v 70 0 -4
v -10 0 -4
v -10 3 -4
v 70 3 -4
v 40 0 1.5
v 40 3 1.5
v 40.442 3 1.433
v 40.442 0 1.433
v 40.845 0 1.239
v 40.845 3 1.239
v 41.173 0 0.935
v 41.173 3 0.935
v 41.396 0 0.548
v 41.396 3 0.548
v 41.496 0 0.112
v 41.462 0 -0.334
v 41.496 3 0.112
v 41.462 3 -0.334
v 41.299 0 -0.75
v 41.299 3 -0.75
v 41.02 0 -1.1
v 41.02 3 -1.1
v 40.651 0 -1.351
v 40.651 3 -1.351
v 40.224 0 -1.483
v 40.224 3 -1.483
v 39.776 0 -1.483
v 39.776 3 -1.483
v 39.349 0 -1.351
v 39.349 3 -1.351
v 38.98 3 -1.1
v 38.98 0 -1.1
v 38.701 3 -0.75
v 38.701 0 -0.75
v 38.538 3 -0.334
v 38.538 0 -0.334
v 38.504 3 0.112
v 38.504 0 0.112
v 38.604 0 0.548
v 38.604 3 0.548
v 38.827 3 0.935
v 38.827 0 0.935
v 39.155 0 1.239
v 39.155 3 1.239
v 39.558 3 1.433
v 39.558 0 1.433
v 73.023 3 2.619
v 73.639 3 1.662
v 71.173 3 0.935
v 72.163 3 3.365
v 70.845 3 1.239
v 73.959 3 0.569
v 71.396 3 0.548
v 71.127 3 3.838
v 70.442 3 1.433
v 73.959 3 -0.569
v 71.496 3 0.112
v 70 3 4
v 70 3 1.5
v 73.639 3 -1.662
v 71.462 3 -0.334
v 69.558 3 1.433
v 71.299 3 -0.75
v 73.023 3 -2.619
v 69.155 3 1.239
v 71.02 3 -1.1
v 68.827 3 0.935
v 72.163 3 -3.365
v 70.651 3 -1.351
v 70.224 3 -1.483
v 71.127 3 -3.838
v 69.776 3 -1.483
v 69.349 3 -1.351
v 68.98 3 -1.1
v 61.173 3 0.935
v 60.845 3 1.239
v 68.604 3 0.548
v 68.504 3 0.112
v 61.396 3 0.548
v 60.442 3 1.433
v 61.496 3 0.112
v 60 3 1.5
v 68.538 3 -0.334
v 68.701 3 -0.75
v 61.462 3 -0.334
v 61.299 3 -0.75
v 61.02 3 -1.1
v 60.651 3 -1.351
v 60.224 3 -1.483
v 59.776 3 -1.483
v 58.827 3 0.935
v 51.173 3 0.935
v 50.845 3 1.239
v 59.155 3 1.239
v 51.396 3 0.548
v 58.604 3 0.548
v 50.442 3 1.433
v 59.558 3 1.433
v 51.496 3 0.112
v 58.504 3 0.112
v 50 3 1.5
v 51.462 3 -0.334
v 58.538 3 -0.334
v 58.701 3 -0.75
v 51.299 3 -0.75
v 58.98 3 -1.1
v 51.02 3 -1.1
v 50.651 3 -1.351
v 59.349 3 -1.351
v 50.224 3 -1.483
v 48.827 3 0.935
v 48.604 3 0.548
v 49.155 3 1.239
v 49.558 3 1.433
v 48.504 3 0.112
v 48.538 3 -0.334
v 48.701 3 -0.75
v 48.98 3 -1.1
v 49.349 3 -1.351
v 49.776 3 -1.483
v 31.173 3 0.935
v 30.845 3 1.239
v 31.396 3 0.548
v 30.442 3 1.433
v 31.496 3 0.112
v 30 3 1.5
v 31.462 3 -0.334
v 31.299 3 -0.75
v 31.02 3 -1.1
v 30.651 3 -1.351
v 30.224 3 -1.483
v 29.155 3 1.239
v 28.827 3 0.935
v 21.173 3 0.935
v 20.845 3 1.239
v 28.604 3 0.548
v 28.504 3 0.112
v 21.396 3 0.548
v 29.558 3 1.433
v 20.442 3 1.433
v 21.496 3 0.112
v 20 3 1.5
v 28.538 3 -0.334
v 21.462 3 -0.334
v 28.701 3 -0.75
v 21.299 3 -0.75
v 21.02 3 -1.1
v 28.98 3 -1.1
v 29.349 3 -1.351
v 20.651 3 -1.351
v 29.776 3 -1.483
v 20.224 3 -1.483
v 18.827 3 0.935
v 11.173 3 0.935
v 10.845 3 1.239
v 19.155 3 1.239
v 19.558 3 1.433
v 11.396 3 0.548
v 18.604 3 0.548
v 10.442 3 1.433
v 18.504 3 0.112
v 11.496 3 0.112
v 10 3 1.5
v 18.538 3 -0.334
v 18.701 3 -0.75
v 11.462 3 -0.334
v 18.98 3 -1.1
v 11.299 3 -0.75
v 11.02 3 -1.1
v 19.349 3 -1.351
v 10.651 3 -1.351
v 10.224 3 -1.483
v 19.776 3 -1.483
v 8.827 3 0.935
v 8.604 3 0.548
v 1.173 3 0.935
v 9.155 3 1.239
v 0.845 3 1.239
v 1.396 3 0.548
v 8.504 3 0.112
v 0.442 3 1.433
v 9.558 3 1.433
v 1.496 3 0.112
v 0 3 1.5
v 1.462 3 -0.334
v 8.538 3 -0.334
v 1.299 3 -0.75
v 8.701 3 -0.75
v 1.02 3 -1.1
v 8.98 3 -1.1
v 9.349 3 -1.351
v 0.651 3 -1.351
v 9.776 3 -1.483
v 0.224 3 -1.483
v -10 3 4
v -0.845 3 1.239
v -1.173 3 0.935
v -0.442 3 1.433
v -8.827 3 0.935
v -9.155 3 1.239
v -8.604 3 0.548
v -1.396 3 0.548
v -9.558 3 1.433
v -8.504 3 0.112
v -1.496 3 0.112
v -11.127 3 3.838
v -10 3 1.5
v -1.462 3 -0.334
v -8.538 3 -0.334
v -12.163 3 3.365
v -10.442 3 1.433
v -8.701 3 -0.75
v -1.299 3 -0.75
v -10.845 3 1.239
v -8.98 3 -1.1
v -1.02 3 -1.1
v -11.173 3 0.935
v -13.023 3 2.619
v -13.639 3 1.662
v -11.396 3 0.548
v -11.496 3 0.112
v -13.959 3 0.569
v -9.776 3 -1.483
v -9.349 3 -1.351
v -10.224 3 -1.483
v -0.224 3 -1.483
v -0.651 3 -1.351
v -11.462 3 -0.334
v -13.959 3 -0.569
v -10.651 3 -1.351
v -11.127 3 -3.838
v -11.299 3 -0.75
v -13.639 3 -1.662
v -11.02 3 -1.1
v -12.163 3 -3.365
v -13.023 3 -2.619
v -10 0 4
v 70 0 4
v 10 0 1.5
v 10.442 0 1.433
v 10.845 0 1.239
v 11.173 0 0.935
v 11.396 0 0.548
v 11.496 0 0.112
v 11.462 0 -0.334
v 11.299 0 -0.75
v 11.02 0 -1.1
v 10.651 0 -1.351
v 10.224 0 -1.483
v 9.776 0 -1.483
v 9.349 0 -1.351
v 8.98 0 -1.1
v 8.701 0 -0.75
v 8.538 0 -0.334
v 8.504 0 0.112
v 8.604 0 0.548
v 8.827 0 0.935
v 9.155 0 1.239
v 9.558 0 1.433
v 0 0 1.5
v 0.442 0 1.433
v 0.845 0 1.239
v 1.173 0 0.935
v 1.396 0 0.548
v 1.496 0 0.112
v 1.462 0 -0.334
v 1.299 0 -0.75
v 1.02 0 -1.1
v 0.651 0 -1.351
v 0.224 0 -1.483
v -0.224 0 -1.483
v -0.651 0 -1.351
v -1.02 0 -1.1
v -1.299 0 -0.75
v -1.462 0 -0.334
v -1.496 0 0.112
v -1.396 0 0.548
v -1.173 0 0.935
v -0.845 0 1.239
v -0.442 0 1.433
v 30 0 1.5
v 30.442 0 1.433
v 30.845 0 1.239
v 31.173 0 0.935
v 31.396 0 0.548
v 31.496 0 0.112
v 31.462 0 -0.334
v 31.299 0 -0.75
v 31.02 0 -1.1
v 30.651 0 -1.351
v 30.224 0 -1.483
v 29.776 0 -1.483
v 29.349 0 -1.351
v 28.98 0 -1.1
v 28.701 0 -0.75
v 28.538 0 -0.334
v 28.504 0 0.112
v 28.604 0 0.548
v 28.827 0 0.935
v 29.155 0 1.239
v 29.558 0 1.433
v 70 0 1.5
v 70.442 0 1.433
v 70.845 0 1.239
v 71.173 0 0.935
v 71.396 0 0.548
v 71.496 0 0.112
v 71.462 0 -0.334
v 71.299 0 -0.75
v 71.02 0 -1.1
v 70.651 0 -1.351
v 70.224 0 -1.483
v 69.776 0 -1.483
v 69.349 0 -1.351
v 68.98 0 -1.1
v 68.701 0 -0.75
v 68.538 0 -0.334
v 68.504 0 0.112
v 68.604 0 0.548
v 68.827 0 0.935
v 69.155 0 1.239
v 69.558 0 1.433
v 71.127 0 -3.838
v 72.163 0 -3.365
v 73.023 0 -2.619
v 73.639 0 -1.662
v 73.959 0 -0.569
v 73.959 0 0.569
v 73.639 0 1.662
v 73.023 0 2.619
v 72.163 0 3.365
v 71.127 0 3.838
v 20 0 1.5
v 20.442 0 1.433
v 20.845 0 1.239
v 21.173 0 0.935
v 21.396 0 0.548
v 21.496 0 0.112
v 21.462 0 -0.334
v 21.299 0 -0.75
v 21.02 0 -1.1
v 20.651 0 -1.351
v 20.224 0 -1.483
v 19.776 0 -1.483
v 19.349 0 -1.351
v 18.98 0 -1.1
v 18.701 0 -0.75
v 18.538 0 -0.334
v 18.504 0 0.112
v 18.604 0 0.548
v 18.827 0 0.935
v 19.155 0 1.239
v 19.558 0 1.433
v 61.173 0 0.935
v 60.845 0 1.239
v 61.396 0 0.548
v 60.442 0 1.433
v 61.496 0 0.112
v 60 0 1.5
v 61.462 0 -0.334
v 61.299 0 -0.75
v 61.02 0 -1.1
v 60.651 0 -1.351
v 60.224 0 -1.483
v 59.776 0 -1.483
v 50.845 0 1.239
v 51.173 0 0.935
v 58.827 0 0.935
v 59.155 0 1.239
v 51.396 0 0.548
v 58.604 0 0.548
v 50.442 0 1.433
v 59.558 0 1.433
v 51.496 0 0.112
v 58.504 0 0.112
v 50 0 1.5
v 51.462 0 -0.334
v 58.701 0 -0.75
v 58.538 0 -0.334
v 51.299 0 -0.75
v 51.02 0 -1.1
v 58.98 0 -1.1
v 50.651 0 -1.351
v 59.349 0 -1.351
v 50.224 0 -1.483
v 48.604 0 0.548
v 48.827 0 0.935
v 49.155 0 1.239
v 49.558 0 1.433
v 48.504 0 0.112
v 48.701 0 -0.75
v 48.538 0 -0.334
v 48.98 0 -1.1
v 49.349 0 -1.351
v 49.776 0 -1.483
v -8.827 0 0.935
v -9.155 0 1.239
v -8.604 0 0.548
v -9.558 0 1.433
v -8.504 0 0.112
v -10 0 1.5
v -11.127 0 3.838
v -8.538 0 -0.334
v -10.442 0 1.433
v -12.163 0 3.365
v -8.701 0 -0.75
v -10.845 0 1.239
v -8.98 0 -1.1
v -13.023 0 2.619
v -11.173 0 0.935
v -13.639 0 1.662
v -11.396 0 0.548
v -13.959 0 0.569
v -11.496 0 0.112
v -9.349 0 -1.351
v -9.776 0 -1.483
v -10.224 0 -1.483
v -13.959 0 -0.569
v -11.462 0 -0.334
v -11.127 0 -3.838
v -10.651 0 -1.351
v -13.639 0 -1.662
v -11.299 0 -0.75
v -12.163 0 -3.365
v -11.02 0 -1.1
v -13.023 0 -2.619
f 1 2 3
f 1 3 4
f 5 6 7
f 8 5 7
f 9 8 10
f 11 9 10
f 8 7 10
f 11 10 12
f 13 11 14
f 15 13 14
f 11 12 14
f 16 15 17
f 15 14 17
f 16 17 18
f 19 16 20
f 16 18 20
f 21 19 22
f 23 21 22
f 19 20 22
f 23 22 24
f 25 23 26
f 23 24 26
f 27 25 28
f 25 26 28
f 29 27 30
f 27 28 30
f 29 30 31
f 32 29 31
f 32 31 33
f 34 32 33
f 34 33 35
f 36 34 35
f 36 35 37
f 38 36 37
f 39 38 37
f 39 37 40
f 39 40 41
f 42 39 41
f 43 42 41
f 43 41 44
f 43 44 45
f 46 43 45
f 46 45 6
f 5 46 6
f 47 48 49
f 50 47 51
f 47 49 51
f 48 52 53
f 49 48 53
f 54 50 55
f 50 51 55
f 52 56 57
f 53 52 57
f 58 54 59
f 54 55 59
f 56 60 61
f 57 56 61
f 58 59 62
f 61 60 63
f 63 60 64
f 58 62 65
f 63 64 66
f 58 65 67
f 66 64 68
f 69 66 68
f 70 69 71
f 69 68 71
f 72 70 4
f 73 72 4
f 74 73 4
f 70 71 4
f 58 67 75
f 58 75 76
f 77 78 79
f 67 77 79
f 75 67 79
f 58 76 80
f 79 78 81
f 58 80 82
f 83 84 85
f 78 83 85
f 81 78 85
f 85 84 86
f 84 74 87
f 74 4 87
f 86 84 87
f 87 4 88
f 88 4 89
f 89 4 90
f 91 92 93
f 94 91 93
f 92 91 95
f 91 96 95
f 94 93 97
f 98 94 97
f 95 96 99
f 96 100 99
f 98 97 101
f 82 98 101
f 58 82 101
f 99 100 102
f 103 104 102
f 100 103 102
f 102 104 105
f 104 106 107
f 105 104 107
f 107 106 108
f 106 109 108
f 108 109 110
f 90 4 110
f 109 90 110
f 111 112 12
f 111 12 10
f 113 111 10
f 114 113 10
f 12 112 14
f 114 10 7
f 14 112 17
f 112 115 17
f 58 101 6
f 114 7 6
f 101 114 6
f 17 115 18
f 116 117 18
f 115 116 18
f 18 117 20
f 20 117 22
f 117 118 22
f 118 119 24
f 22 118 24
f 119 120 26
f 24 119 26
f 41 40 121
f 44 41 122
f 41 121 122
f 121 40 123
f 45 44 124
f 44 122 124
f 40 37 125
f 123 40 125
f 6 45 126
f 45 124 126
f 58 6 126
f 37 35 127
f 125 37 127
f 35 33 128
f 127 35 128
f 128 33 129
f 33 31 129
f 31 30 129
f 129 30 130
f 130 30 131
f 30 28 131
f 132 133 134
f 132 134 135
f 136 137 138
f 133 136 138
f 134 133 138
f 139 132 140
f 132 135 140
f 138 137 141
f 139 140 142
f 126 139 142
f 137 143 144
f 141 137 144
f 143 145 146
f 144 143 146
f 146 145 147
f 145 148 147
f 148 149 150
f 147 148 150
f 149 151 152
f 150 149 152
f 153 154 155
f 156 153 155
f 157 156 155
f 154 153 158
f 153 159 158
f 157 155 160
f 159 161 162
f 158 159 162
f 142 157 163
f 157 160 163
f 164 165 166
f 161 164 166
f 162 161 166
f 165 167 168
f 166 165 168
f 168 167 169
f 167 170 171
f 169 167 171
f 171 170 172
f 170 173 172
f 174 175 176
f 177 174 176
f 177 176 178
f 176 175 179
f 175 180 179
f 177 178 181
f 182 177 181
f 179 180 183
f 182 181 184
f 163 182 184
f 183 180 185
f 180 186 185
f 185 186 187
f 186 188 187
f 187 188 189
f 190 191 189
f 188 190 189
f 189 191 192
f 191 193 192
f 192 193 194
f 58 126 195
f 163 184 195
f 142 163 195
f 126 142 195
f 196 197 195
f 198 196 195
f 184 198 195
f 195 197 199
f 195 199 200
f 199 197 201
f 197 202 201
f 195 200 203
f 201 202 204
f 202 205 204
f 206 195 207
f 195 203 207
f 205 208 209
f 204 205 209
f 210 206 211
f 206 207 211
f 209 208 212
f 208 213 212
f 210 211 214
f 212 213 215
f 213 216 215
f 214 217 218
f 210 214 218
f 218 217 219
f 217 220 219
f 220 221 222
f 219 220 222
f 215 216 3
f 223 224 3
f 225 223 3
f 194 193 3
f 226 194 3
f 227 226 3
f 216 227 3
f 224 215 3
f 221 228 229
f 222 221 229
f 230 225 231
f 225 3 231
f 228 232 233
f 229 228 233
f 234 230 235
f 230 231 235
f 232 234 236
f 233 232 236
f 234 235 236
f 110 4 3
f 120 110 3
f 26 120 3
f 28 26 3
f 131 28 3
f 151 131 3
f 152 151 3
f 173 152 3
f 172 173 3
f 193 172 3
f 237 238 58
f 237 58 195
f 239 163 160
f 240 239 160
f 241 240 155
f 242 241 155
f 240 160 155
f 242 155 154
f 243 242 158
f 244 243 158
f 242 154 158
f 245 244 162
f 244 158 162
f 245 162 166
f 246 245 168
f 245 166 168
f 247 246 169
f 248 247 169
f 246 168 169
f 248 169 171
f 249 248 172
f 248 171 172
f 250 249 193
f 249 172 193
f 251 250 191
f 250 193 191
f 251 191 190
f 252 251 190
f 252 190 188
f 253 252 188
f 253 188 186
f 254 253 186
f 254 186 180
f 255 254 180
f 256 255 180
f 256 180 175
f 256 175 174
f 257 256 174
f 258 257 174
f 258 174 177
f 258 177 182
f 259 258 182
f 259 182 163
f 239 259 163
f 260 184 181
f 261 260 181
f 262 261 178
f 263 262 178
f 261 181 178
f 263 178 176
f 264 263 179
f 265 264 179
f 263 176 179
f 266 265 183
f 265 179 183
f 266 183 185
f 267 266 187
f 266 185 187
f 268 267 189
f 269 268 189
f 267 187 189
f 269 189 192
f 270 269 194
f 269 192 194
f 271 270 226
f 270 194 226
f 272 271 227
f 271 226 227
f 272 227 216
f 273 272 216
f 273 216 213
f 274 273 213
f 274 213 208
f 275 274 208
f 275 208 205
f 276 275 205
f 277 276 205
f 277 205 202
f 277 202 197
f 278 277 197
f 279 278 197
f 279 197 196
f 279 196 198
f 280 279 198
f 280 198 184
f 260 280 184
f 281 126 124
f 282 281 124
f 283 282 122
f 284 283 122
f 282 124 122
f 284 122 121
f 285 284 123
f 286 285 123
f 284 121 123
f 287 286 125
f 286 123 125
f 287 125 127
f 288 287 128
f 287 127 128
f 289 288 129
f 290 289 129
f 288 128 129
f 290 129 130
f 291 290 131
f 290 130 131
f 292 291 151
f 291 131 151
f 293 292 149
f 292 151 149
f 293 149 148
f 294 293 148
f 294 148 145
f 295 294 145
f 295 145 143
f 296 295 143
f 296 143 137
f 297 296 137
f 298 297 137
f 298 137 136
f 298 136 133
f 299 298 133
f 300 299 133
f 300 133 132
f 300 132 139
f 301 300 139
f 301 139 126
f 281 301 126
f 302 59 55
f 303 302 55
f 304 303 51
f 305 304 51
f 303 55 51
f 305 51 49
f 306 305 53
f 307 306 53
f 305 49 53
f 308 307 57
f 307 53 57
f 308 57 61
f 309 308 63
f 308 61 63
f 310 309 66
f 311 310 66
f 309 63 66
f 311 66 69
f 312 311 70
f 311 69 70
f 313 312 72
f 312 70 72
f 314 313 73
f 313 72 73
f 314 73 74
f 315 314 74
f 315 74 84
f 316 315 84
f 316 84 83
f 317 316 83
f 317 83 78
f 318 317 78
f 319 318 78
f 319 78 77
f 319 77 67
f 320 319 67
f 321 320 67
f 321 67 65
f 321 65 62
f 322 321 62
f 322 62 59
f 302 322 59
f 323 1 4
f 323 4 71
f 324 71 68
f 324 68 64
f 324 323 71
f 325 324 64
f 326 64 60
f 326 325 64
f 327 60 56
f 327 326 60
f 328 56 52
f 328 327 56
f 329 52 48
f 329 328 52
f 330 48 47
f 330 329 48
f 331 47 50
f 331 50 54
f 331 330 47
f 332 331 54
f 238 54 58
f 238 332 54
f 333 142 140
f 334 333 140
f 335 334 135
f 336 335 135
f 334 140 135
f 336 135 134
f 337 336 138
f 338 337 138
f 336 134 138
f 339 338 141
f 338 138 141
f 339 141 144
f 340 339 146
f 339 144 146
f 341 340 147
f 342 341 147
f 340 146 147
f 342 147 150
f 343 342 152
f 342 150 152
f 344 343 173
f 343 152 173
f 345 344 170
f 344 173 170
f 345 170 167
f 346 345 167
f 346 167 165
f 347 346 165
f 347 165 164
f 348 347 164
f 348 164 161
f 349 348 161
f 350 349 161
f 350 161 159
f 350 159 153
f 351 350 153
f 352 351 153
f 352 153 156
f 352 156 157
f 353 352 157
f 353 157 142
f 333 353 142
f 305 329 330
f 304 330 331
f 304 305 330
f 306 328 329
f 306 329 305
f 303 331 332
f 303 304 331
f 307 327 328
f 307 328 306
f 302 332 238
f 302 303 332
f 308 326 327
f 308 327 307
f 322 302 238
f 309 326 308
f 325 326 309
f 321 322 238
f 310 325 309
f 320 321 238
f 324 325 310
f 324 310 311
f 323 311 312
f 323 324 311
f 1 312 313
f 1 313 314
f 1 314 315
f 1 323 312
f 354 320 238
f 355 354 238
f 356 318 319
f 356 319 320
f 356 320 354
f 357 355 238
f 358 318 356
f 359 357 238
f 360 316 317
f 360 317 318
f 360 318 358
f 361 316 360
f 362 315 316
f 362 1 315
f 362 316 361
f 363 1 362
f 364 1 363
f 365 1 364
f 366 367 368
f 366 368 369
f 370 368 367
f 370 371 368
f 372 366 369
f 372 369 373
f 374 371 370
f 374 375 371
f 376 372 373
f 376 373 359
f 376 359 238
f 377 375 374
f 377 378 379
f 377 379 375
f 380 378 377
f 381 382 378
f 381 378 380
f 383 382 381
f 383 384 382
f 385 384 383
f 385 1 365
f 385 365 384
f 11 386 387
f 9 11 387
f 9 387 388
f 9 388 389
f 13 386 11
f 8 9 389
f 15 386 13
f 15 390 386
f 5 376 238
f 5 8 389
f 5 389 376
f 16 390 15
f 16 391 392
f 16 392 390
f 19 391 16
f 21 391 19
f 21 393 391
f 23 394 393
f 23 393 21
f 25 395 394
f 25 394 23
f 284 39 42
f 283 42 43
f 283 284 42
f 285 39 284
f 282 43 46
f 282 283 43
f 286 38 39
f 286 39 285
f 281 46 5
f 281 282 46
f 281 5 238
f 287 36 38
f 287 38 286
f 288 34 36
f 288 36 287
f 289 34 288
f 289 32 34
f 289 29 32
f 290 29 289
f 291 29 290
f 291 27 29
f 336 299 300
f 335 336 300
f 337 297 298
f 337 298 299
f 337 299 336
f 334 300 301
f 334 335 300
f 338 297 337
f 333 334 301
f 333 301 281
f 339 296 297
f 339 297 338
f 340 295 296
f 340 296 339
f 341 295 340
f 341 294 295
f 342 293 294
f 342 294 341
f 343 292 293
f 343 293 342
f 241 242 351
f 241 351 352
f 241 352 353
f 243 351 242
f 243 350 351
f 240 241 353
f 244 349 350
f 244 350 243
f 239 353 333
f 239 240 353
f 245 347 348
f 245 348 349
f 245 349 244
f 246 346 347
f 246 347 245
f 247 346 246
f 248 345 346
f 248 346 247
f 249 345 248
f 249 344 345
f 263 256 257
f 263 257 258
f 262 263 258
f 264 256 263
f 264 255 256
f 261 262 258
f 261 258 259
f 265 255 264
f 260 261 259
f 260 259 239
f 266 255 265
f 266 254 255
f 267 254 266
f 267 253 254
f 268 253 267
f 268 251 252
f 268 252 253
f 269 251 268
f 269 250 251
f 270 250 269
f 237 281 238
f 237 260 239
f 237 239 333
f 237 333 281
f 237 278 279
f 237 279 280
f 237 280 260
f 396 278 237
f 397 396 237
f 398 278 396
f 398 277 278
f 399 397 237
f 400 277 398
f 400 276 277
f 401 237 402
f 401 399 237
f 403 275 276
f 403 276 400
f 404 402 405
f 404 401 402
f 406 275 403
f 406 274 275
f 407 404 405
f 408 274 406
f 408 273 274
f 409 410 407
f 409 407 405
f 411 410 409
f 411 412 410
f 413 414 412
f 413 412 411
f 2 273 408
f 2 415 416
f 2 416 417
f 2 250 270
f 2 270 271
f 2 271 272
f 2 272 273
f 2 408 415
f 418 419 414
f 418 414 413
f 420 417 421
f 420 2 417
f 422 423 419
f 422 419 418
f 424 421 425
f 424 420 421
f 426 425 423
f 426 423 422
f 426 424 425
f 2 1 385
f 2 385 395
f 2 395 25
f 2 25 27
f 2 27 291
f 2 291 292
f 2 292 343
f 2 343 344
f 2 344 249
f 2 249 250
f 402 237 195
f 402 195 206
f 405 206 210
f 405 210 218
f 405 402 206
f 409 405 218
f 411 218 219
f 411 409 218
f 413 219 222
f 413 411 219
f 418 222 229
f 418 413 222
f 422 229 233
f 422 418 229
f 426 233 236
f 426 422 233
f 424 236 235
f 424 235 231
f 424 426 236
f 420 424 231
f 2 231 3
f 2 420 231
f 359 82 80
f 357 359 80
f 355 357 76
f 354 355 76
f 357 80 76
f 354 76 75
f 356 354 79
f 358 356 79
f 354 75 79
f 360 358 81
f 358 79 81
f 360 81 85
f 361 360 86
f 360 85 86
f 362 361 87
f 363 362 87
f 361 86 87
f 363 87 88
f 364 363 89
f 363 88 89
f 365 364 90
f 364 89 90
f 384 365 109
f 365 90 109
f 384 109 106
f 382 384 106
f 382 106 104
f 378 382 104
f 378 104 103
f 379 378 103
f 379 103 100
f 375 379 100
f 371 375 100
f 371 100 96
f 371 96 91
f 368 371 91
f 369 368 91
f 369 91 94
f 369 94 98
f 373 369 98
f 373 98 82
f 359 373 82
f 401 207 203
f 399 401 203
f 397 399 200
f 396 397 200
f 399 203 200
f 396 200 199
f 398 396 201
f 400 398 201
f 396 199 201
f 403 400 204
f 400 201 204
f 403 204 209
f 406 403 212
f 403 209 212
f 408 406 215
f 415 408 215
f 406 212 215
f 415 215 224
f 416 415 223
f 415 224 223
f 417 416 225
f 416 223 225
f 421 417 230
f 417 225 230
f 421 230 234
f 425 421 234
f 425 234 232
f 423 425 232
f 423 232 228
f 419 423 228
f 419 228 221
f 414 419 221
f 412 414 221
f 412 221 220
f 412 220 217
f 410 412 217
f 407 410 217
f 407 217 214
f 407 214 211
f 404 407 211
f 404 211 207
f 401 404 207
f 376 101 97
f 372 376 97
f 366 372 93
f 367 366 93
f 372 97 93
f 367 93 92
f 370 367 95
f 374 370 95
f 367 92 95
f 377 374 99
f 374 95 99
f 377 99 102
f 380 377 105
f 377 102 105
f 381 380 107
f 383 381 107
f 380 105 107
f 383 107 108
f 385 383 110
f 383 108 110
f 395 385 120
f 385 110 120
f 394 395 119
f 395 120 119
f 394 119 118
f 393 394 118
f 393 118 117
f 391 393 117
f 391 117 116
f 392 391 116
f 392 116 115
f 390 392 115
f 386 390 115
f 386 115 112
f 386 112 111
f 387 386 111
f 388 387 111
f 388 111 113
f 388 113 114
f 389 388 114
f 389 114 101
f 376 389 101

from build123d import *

# Parameters (mm, degrees)
OUTER_BODY_DEPTH = 3
SKETCH8_R        = 1.5
HOLES_DEPTH      = 75.168726563


with BuildPart() as part:
    # Sketch1 → Outer Body (new body)
    with BuildSketch(Plane(origin=(0, 0, 0), x_dir=(1, 0, 0), z_dir=(0, 1, 0))):
        with BuildLine():
            Line((-10, 4), (70, 4))
            ThreePointArc((70, 4), (74, 0), (70, -4))
            Line((70, -4), (-10, -4))
            ThreePointArc((-10, -4), (-14, 0), (-10, 4))
        make_face()
    extrude(amount=OUTER_BODY_DEPTH)

    # Sketch8 → Holes (cut, through all)
    with BuildSketch(Plane(origin=(0, 3, 0), x_dir=(1, 0, 0), z_dir=(0, 1, 0))):
        with Locations(Location((-10, 0, 0), (0, 0, 270))):
            Circle(SKETCH8_R)
        with Locations(Location((0, 0, 0), (0, 0, 270))):
            Circle(SKETCH8_R)
        with Locations(Location((50, 0, 0), (0, 0, 270))):
            Circle(SKETCH8_R)
        with Locations(Location((70, 0, 0), (0, 0, 270))):
            Circle(SKETCH8_R)
        with Locations(Location((60, 0, 0), (0, 0, 270))):
            Circle(SKETCH8_R)
        with Locations(Location((10, 0, 0), (0, 0, 270))):
            Circle(SKETCH8_R)
        with Locations(Location((20, 0, 0), (0, 0, 270))):
            Circle(SKETCH8_R)
        with Locations(Location((30, 0, 0), (0, 0, 270))):
            Circle(SKETCH8_R)
        with Locations(Location((40, 0, 0), (0, 0, 270))):
            Circle(SKETCH8_R)
    extrude(amount=-HOLES_DEPTH, mode=Mode.SUBTRACT)


solid = part.part
